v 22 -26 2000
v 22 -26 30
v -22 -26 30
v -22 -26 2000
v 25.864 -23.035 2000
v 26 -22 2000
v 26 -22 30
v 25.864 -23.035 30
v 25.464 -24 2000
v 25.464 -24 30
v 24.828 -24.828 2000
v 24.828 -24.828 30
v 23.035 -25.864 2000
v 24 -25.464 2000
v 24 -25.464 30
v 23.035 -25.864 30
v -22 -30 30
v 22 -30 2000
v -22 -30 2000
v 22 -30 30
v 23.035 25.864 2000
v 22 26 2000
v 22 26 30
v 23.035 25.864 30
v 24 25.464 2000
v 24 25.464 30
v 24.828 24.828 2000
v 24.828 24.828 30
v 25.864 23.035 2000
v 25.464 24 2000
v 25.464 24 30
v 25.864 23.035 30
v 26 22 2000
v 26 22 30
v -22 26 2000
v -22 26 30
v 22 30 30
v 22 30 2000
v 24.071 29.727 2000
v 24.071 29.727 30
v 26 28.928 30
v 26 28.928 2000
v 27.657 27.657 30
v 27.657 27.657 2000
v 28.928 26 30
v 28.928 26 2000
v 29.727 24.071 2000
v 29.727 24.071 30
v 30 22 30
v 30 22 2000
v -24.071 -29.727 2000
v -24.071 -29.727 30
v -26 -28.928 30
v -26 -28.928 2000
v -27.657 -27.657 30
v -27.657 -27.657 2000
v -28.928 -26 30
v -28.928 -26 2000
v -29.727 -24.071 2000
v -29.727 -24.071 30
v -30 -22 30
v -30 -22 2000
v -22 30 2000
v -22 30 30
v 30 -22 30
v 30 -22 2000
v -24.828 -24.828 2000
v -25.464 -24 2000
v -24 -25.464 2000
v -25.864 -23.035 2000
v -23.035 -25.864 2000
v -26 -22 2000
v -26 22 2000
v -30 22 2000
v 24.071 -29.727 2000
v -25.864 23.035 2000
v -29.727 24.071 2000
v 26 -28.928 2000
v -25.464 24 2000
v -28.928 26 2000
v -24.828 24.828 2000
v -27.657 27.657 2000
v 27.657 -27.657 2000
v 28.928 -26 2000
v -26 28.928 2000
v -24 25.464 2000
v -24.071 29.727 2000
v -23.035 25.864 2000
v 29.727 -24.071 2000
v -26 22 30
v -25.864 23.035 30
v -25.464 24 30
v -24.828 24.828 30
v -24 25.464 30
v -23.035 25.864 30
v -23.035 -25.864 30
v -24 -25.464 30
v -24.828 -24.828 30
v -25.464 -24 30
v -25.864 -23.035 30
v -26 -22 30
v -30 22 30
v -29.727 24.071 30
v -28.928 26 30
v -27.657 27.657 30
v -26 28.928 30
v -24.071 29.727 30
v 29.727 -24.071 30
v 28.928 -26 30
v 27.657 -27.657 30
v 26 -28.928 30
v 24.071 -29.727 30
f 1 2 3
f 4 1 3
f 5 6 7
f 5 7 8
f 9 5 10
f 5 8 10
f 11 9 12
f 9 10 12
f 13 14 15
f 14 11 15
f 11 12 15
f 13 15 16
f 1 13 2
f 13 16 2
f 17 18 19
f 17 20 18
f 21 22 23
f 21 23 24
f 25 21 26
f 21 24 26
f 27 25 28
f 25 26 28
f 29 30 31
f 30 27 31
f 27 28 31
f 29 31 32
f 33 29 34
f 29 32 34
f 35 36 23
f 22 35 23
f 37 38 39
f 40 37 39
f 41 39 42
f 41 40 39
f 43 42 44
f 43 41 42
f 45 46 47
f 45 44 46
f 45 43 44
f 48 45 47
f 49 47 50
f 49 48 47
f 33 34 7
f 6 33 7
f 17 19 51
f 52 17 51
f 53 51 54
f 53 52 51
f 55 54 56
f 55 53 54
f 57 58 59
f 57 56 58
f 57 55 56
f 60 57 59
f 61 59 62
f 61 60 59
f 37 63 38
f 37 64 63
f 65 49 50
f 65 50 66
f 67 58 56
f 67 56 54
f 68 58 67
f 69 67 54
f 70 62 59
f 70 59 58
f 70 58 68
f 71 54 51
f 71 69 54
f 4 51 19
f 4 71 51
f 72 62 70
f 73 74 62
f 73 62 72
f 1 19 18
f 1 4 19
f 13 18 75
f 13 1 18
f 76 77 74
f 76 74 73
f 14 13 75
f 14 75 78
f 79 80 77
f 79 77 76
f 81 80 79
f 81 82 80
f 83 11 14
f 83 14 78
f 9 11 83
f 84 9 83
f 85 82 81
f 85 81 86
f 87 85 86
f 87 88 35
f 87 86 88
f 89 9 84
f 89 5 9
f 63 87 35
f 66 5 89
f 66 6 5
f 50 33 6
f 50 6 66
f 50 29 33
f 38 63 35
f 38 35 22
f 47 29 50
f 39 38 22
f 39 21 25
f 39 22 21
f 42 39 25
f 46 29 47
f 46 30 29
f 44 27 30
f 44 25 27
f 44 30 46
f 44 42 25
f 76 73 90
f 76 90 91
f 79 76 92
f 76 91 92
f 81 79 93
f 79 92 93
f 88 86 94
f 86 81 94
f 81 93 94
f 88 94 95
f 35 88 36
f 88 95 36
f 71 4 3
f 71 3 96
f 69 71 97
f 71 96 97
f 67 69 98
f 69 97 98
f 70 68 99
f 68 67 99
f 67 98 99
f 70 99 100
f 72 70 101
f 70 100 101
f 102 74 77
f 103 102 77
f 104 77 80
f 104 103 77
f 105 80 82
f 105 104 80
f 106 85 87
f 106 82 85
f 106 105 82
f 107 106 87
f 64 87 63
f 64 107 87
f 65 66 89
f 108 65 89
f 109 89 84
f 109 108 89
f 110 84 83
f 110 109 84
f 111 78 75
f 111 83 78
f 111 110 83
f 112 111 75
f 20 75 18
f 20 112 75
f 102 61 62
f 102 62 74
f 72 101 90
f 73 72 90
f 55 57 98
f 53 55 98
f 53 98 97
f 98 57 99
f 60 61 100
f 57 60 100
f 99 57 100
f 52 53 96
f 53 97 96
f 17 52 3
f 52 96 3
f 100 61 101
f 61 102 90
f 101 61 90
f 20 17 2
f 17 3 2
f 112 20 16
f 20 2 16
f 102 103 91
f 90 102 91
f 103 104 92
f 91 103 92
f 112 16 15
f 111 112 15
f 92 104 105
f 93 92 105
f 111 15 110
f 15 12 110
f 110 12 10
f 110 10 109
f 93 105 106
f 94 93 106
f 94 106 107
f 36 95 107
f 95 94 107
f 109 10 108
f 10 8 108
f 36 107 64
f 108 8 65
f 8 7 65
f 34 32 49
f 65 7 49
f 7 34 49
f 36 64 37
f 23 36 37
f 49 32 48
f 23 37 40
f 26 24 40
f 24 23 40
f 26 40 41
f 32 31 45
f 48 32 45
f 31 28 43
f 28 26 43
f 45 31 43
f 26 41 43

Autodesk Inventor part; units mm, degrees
ref_plane "Start Plane" through (0, 0, 30) normal (0, 0, 1) x (1, 0, 0)
ref_plane "End Plane" through (0, 0, 2000) normal (0, 0, 1) x (1, 0, 0)
sketch "Sketch" plane through (0, 0, 0) normal (0, 0, 1) x (1, 0, 0)
  line L0 (-30, -22) -> (-30, 22)
  line L1 (-22, 30) -> (22, 30)
  line L2 (30, 22) -> (30, -22)
  line L3 (22, -30) -> (-22, -30)
  arc A0 (-30, -22) -> (-22, -30) centre (-22, -22) ccw
  arc A1 (30, 22) -> (22, 30) centre (22, 22) ccw
  arc A2 (-22, 30) -> (-30, 22) centre (-22, 22) ccw
  arc A3 (22, -30) -> (30, -22) centre (22, -22) ccw
  arc A4 (-22, 26) -> (-26, 22) centre (-22, 22) ccw
  line L4 (-22, 26) -> (22, 26)
  arc A5 (26, 22) -> (22, 26) centre (22, 22) ccw
  line L5 (26, 22) -> (26, -22)
  arc A6 (22, -26) -> (26, -22) centre (22, -22) ccw
  line L6 (22, -26) -> (-22, -26)
  arc A7 (-26, -22) -> (-22, -26) centre (-22, -22) ccw
  line L7 (-26, -22) -> (-26, 22)
  line L8 (0, 44.3196) -> (0, -44.3196) construction
  line L9 (-44.3196, 0) -> (44.3196, 0) construction
  dimension "d7" = 8
  dimension "d9" = 60
  dimension "d11" = 60
  dimension "d12" = 4
  dimension "d15" = 30
  dimension "d16" = 30
extrude "Body" add sketch "Sketch" along normal up to surface (1970 mm away) from surface at 30
sketch "Sketch3" plane through (0, 0, 0) normal (0, 0, 1) x (1, 0, 0)
  line L0 (0, 0) -> (10, 0)
ref_plane "Work Plane3" through (0, 0, 0) normal (0, -1, 0) x (1, 0, 0)
ref_plane "Work Plane4" through (-1750, -22, 30) normal (0, 0, -1) x (-1, 0, 0)
split "Split1" plane through (-1750, -22, 30) removes the side toward (0, 0, -1)
sketch "Sketch4" plane through (0, 0, 0) normal (0, -1, 0) x (1, 0, 0)
  line L0 (-2, 30) -> (12, 30) projected
  line L1 (-2, 2000) -> (12, 2000) projected
  dimension "d18" = 1970
equation "\"d7\" = G_IR"
equation "\"d9\" = G_W"
equation "\"d11\" = G_H"
equation "\"d12\" = G_T"
equation "\"d15\" = 0.5 * d9"
equation "\"d16\" = 0.5 * d11"
equation "\"d3\" = G_L"
equation "\"G_W\" = 60"
equation "\"G_H\" = 60"
equation "\"G_T\" = 4"
equation "\"G_IR\" = 8"
equation "\"G_L\" = d18"
equation "\"G_OFFSET_END\" = 0"
properties part number "ISO 10799-2 - 60x60x4 - 1970" material "Steel, Mild"
